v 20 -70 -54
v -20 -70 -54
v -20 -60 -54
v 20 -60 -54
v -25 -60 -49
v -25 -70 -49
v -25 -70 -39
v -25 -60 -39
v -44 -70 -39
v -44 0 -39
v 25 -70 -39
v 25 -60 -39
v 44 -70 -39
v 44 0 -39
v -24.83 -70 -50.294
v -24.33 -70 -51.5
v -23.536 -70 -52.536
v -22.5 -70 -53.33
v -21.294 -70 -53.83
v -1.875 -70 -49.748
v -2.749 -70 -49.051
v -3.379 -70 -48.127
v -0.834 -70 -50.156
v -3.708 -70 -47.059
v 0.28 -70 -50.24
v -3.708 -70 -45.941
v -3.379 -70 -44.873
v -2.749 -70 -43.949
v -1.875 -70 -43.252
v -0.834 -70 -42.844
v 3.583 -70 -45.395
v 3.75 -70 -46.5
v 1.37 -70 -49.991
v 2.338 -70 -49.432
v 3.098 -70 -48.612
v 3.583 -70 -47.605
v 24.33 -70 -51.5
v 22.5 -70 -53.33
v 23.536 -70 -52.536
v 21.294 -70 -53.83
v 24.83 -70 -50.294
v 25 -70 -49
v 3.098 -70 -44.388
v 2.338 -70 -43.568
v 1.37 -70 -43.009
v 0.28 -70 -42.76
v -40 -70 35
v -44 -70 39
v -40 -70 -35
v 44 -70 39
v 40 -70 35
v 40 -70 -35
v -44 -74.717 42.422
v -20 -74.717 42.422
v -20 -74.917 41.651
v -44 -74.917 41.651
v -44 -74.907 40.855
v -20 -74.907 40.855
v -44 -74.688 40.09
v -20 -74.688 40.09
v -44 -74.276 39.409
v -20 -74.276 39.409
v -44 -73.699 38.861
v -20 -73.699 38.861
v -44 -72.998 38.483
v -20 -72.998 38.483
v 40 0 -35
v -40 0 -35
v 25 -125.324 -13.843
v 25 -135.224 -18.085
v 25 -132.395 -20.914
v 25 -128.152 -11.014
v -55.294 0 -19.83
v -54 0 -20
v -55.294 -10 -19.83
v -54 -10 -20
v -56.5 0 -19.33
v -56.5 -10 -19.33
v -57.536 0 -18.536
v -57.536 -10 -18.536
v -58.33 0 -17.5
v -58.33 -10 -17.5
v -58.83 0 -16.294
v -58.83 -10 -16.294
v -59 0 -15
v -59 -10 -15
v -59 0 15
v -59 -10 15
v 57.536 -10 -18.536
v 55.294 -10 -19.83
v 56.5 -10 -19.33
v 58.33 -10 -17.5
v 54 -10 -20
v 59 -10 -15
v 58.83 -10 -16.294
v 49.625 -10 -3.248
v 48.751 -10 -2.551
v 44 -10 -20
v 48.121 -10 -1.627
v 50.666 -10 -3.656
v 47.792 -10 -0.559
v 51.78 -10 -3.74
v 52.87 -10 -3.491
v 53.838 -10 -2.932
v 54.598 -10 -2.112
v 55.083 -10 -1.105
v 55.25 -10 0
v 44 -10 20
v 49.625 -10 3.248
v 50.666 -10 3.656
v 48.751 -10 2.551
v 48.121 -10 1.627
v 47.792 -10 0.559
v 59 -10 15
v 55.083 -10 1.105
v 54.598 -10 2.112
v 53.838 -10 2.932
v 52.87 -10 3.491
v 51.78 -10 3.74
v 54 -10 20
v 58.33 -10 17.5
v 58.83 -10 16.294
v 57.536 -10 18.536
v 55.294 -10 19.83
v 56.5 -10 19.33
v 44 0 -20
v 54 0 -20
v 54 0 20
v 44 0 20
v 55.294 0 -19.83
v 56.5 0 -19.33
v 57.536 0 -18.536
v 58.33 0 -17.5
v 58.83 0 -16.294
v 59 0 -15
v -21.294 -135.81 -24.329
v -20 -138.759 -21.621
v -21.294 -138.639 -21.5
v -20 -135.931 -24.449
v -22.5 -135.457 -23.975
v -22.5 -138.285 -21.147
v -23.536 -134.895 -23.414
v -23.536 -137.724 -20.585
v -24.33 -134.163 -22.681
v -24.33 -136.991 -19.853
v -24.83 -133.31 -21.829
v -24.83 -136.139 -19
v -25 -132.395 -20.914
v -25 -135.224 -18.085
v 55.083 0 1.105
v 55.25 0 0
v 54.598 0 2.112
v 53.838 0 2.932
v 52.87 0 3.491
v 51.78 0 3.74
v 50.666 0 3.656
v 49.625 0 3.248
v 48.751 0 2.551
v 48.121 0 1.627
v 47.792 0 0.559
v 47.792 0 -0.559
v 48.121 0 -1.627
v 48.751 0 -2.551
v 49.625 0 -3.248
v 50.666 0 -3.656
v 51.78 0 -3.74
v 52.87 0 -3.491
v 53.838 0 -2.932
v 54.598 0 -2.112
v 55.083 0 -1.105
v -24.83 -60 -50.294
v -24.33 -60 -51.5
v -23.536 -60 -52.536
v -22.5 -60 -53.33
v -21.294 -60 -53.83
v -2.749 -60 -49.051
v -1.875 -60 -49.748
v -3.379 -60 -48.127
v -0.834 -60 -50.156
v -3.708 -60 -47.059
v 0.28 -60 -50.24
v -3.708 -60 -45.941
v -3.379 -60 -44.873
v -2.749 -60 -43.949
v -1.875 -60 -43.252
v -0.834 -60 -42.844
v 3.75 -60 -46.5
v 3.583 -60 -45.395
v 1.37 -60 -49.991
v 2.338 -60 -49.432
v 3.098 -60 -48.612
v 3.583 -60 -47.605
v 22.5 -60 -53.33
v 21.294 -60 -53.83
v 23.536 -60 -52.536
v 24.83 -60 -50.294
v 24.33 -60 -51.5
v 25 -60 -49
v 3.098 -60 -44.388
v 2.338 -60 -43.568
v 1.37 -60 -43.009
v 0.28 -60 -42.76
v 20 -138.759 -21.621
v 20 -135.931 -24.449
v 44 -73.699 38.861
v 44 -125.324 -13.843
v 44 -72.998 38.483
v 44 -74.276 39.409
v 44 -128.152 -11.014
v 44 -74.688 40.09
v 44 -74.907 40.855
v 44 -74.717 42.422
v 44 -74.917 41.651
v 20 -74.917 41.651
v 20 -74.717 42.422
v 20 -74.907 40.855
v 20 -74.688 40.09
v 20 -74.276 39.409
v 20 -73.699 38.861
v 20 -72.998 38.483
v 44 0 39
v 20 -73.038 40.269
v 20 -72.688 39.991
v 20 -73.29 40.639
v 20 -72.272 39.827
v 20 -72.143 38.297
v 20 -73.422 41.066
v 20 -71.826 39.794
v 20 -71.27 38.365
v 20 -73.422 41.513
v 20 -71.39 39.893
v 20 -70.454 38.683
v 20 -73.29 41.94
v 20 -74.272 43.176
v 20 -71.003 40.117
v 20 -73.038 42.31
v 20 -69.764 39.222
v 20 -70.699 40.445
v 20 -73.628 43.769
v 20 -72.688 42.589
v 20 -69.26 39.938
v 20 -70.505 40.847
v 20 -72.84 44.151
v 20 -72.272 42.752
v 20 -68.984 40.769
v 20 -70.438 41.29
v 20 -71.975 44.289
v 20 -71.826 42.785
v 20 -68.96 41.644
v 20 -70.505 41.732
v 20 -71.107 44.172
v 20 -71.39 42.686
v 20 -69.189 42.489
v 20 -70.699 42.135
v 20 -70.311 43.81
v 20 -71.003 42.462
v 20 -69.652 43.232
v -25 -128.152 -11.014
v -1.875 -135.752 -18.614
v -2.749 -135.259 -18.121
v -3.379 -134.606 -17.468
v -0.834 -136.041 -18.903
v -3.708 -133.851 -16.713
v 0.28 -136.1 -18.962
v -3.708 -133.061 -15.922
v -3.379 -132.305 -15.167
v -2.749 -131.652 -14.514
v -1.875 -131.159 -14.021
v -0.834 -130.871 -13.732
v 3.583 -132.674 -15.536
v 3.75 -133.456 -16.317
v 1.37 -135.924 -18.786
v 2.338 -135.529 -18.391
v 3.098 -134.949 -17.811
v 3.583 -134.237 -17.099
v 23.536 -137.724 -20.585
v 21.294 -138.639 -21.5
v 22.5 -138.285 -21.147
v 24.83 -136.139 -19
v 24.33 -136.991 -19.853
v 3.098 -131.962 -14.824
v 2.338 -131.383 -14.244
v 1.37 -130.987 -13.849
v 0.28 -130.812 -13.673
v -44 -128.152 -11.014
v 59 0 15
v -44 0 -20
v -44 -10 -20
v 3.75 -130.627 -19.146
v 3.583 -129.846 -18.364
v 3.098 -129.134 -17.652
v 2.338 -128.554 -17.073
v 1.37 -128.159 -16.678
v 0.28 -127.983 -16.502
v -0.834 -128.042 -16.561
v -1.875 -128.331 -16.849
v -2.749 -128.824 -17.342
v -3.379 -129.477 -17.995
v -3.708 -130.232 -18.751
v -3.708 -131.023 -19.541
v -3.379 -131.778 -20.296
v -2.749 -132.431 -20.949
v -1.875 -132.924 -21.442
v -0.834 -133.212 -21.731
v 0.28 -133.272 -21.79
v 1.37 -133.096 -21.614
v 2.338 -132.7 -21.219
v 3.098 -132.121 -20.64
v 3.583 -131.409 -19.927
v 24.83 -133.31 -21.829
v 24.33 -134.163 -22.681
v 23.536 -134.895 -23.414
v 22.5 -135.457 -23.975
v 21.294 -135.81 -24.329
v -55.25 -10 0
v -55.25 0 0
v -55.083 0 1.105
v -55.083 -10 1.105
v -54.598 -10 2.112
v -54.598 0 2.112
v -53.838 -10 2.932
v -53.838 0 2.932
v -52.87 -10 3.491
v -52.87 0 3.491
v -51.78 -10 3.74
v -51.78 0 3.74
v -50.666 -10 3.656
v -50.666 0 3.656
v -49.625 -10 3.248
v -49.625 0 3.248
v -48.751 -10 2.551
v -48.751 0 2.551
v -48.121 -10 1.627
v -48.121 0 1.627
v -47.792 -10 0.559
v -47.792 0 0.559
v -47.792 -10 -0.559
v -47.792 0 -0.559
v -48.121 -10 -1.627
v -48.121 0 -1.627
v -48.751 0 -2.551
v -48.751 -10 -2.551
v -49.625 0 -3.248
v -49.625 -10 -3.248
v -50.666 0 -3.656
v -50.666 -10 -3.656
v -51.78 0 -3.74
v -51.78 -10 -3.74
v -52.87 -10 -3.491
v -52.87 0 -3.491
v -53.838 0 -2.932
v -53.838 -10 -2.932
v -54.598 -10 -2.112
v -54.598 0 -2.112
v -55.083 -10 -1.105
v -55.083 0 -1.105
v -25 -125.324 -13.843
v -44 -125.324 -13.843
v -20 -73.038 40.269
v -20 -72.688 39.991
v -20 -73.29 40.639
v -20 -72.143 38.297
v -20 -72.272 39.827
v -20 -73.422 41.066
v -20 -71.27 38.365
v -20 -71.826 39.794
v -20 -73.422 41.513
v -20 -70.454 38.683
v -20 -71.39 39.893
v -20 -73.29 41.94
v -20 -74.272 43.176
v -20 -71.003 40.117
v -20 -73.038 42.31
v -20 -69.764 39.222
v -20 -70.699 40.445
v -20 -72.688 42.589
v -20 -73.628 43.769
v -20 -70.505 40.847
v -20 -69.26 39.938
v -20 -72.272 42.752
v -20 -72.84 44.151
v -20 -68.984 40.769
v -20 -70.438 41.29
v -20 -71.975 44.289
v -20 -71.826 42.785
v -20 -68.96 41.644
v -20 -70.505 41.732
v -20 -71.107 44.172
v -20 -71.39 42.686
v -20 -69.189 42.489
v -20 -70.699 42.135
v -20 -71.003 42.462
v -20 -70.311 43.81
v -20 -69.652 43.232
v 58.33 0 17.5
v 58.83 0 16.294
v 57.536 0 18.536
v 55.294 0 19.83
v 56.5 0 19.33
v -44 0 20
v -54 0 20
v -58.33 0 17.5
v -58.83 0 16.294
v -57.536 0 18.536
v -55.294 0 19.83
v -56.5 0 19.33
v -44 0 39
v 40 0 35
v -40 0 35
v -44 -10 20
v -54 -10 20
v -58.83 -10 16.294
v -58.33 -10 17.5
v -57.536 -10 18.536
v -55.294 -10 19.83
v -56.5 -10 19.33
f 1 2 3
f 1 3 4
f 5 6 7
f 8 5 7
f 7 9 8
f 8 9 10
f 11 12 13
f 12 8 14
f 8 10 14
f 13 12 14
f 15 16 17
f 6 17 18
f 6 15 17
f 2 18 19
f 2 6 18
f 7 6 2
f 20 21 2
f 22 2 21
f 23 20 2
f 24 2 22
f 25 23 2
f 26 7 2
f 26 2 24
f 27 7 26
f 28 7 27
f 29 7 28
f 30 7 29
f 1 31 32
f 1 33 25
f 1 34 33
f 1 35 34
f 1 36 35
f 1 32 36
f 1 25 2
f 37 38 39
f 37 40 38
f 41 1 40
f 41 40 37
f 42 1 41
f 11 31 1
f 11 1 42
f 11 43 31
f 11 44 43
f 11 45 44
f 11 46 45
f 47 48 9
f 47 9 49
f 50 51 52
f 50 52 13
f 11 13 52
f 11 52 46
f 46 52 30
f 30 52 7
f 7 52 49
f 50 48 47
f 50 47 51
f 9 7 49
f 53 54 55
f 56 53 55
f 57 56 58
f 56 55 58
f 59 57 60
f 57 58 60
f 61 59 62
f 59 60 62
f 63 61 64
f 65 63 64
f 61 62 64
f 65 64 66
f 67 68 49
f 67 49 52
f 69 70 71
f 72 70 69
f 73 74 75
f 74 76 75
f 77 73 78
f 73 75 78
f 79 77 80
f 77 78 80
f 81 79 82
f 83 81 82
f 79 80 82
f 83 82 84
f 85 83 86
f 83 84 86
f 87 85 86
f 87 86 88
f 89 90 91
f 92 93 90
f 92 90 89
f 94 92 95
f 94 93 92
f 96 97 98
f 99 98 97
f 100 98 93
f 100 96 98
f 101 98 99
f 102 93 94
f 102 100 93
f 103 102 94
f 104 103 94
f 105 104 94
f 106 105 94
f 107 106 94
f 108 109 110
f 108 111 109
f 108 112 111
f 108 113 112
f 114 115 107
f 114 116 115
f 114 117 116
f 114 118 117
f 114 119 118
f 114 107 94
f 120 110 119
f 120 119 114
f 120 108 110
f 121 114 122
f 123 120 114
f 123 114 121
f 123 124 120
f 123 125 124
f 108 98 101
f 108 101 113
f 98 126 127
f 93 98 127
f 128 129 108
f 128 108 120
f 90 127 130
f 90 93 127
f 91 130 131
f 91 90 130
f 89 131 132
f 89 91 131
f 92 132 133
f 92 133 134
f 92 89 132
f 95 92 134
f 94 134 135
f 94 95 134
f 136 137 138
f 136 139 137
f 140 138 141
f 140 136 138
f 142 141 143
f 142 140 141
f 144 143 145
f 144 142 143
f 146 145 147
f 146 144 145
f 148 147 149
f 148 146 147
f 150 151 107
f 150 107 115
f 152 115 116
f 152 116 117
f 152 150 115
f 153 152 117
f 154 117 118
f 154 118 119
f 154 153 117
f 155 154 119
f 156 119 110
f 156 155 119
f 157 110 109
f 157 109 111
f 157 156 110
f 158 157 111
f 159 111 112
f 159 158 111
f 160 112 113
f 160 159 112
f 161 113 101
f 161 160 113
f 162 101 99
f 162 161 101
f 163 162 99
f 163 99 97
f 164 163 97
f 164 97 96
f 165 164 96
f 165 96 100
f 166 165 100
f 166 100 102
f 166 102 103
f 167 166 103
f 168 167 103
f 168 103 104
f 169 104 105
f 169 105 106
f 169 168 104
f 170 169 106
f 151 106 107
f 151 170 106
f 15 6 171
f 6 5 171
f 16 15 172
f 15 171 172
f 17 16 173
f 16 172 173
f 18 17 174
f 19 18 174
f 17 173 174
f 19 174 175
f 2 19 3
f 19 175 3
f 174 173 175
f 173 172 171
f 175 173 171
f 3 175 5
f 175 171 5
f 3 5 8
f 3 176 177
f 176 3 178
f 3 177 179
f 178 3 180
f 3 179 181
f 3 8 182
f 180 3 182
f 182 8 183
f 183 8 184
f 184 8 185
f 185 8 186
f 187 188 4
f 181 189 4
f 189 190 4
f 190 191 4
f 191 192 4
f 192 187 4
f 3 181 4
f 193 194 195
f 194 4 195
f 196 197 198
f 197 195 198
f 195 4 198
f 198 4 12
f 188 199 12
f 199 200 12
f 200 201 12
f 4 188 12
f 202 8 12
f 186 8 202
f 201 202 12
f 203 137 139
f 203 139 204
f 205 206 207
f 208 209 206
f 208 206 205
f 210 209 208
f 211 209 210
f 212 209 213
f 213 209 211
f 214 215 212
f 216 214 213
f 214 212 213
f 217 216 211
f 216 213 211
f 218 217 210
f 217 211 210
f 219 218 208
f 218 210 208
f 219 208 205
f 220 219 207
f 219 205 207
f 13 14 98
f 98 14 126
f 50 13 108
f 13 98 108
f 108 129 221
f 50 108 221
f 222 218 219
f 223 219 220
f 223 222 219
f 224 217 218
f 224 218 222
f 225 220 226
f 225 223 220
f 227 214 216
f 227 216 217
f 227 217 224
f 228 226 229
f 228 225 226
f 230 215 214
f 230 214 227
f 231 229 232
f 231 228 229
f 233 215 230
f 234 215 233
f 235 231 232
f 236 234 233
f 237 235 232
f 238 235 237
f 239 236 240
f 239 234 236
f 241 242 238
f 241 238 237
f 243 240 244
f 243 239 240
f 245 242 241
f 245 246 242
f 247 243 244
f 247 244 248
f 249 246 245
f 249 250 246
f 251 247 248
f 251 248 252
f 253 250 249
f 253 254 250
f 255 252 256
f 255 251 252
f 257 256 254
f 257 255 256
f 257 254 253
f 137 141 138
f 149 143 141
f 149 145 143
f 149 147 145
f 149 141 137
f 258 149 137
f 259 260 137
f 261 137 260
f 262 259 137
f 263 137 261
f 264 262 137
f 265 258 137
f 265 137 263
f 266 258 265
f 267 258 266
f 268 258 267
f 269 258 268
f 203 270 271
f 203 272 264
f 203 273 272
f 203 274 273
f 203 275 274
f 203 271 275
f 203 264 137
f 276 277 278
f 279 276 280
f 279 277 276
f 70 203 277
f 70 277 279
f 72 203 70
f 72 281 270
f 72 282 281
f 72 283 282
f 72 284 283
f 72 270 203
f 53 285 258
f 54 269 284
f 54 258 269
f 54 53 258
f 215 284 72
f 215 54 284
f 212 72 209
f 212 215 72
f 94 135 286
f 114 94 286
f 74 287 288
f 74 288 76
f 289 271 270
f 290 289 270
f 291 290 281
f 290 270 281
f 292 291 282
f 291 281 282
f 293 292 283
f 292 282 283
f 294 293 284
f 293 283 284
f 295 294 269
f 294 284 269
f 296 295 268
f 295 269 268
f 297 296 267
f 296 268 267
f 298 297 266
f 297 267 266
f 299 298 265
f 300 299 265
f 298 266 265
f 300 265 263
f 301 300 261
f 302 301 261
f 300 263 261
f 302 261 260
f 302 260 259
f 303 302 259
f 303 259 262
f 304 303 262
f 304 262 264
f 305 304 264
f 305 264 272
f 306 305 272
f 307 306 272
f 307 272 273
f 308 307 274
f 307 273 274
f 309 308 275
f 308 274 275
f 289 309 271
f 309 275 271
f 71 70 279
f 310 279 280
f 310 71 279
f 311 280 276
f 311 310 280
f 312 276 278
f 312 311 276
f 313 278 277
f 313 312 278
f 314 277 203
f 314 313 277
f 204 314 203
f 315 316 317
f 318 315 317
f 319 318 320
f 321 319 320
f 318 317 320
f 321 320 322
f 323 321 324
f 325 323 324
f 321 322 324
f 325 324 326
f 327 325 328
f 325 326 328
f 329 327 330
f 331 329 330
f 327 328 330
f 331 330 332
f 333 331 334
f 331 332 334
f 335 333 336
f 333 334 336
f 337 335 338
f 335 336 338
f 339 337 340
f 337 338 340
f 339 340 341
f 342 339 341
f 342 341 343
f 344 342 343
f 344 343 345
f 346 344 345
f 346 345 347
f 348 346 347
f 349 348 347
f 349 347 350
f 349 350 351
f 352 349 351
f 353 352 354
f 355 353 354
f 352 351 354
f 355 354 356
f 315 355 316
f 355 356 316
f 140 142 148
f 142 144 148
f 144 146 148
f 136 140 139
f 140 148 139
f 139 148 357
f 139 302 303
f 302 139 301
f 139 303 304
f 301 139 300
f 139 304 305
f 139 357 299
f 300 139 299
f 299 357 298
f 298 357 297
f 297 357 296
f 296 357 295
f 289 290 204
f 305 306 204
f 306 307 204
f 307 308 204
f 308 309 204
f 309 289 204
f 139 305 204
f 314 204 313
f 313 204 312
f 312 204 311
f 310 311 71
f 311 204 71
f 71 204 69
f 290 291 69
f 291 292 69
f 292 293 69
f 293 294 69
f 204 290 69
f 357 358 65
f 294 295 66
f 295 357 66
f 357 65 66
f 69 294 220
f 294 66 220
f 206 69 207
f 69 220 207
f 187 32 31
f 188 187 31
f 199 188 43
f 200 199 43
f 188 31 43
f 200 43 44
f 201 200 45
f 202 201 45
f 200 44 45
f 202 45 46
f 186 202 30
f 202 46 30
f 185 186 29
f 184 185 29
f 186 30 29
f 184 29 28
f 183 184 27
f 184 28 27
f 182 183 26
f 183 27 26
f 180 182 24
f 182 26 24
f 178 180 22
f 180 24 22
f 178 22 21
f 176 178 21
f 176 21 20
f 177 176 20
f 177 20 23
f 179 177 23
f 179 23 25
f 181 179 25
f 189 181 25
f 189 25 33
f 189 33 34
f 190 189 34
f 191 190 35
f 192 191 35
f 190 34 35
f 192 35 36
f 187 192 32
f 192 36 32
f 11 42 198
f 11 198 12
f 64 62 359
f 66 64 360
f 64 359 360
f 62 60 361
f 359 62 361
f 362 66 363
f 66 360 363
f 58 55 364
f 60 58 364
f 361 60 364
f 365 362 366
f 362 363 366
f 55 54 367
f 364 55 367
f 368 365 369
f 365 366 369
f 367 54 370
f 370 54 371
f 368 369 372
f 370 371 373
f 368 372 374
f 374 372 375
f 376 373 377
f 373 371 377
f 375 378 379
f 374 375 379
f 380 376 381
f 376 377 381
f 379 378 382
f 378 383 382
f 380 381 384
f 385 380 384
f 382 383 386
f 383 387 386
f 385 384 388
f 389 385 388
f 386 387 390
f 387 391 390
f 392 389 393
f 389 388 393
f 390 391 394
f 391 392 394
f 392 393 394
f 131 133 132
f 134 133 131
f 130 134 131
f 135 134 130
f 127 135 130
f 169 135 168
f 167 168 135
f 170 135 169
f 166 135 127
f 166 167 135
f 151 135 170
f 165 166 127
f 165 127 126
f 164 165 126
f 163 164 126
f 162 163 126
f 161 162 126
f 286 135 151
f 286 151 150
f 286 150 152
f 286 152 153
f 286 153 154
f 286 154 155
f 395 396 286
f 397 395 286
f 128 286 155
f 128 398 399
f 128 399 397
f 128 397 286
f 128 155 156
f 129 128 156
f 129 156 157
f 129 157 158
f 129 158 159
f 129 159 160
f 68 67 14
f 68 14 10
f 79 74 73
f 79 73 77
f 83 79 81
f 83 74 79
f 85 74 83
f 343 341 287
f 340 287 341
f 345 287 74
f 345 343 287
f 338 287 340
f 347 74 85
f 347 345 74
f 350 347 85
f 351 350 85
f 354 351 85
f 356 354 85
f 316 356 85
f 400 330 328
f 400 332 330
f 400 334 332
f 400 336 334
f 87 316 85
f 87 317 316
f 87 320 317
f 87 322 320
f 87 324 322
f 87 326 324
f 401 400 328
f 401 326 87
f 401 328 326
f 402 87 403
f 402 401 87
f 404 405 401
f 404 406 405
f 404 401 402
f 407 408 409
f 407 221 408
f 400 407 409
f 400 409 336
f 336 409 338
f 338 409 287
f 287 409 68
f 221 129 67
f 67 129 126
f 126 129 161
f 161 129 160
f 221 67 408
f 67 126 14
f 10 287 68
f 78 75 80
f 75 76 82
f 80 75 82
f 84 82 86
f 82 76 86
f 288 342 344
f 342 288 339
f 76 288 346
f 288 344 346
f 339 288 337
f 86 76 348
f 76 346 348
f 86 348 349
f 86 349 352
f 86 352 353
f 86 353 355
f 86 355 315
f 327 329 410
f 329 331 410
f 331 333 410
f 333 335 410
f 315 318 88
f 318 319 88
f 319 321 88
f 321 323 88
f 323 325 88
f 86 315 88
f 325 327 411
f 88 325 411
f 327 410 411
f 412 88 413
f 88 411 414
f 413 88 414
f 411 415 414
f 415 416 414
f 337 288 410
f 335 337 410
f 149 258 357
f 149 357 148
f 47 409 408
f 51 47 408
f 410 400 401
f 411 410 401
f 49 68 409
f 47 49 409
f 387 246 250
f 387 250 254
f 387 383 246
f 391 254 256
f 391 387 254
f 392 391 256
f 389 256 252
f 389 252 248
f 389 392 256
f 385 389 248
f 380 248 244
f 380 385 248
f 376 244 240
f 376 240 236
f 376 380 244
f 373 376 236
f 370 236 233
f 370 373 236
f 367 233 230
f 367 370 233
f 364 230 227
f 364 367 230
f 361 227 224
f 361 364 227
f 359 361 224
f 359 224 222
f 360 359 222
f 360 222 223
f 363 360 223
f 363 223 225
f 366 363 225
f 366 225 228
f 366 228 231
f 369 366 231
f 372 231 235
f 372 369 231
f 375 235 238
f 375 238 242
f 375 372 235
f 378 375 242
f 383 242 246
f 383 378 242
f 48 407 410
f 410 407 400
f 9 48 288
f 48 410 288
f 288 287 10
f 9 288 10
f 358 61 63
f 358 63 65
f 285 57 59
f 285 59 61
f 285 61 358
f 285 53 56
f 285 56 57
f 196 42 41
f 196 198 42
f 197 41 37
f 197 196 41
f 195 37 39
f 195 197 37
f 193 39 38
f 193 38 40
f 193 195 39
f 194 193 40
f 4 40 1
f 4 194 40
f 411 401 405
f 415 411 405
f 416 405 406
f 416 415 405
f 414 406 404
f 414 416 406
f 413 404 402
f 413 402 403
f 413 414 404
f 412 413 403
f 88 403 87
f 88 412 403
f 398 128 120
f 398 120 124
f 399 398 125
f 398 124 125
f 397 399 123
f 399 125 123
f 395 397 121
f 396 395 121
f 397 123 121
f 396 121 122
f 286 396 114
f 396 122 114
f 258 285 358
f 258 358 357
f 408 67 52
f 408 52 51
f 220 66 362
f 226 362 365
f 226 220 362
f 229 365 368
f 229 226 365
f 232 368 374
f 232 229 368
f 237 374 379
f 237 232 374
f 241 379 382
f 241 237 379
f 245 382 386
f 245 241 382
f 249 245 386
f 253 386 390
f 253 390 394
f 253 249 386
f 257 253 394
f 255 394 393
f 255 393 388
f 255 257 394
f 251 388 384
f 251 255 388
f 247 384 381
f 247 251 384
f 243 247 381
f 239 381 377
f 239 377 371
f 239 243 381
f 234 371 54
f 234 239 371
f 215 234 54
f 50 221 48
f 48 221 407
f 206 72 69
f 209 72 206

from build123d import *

# Parameters (mm, degrees)
F0_W           = 80
F0_H           = 70
F1_DEPTH       = 70
F0_W_2         = 15
F0_H_2         = 40
F0_R           = 3.75
F2_DEPTH       = 10
F3_R           = 5
F6_W           = 50
F6_H           = 15
F6_R           = 3.75
F7_DEPTH       = 10
F8_R           = 5
F9_R           = 3
F9_R_2         = 1.5
F10_DEPTH      = 20
F13_END_RADIUS = 3
F12_W          = 88
F12_H          = 4
F13_REACH      = 196.483987292
F14_R          = 3.75
F15_DEPTH      = 4
F16_R          = 5


with BuildPart() as f1:
    # F0 (on Front) → F1 (new body)
    with BuildSketch(Plane.XZ):
        Polygon((44, 39), (-44, 39), (-44, -39), (44, -39), (44, -20), (44, 20), align=None)
        Rectangle(F0_W, F0_H, mode=Mode.SUBTRACT)
    extrude(amount=F1_DEPTH)

    # F0 (on Front) → F2 (join)
    with BuildSketch(Plane.XZ):
        with Locations((51.5, 0)):
            Rectangle(F0_W_2, F0_H_2)
        with Locations((51.5, 0)):
            Circle(F0_R, mode=Mode.SUBTRACT)
    extrude(amount=F2_DEPTH)

    # F3
    f3_edges = [f1.edges().sort_by_distance(p)[0] for p in [
        (59, -5, 20),
        (59, -5, -20),
    ]]
    fillet(f3_edges, radius=F3_R)

    # F4: F1 across plane


with BuildPart() as f1_1:
    add(f1.part)
    add(f1.part.mirror(Plane.YZ))

    # F6 (on face) → F7 (join)
    with BuildSketch(Plane.XZ.offset(70)):
        with Locations((0, -46.5)):
            Rectangle(F6_W, F6_H)
        with Locations((0, -46.5)):
            Circle(F6_R, mode=Mode.SUBTRACT)
    extrude(amount=-F7_DEPTH)

    # F8
    f8_edges = [f1_1.edges().sort_by_distance(p)[0] for p in [
        (25, -65, -54),
        (-25, -65, -54),
    ]]
    fillet(f8_edges, radius=F8_R)


with BuildPart() as f10:
    # F9 (on Right) → F10 (new body, symmetric)
    with BuildSketch(Plane.YZ):
        with Locations((-71.9384711885, 41.2896133847)):
            Circle(F9_R)
        with Locations((-71.9384711885, 41.2896133847)):
            Circle(F9_R_2, mode=Mode.SUBTRACT)
    extrude(amount=F10_DEPTH, both=True)

    f13_end = (Plane(origin=(0, -71.9384711885, 41.2896133847), x_dir=(0, 0, 1), z_dir=(1, 0, 0)) * Cylinder(F13_END_RADIUS, 734.7317676539, mode=Mode.PRIVATE)).faces().sort_by_distance((0, -74.9384711885, 41.2896133847))[0]
    # F12 (on face) → F13 (join, up to the whole of a round face its end follows)
    with BuildSketch(Plane(origin=(0, -54.5, -54.5), x_dir=(-1, 0, 0), z_dir=(0, 0.7071067812, 0.7071067812))):
        with Locations((0, 80.8292925358)):
            Rectangle(F12_W, F12_H)
    f13_long = extrude(amount=F13_REACH, mode=Mode.PRIVATE)
    add(split(f13_long, bisect_by=f13_end, keep=Keep.ALL, mode=Mode.PRIVATE).solids().sort_by_distance((0, -111.6549408706, 2.6549408706))[0])

    # F14 (on face) → F15 (join)
    with BuildSketch(Plane(origin=(0, -58.5691544329, 58.5691544329), x_dir=(1, 0, 0), z_dir=(0, -0.7071067812, 0.7071067812))):
        Polygon((44, -77.0746391493), (-44, -77.0746391493), (-44, -98.4056391493), (-25, -98.4056391493), (-25, -113.4056391493), (25, -113.4056391493), (25, -98.4056391493), (44, -98.4056391493), align=None)
        with Locations((0, -105.9056391493)):
            Circle(F14_R, mode=Mode.SUBTRACT)
    extrude(amount=-F15_DEPTH)

    # F16
    f16_edges = [f10.edges().sort_by_distance(p)[0] for p in [
        (25, -137.344837, -23.034956),
        (-25, -137.344837, -23.034956),
    ]]
    fillet(f16_edges, radius=F16_R)


with BuildPart() as f10_1:
    # F17: moved
    add(f10.part)


solid = Compound([f1_1.part, f10_1.part])
